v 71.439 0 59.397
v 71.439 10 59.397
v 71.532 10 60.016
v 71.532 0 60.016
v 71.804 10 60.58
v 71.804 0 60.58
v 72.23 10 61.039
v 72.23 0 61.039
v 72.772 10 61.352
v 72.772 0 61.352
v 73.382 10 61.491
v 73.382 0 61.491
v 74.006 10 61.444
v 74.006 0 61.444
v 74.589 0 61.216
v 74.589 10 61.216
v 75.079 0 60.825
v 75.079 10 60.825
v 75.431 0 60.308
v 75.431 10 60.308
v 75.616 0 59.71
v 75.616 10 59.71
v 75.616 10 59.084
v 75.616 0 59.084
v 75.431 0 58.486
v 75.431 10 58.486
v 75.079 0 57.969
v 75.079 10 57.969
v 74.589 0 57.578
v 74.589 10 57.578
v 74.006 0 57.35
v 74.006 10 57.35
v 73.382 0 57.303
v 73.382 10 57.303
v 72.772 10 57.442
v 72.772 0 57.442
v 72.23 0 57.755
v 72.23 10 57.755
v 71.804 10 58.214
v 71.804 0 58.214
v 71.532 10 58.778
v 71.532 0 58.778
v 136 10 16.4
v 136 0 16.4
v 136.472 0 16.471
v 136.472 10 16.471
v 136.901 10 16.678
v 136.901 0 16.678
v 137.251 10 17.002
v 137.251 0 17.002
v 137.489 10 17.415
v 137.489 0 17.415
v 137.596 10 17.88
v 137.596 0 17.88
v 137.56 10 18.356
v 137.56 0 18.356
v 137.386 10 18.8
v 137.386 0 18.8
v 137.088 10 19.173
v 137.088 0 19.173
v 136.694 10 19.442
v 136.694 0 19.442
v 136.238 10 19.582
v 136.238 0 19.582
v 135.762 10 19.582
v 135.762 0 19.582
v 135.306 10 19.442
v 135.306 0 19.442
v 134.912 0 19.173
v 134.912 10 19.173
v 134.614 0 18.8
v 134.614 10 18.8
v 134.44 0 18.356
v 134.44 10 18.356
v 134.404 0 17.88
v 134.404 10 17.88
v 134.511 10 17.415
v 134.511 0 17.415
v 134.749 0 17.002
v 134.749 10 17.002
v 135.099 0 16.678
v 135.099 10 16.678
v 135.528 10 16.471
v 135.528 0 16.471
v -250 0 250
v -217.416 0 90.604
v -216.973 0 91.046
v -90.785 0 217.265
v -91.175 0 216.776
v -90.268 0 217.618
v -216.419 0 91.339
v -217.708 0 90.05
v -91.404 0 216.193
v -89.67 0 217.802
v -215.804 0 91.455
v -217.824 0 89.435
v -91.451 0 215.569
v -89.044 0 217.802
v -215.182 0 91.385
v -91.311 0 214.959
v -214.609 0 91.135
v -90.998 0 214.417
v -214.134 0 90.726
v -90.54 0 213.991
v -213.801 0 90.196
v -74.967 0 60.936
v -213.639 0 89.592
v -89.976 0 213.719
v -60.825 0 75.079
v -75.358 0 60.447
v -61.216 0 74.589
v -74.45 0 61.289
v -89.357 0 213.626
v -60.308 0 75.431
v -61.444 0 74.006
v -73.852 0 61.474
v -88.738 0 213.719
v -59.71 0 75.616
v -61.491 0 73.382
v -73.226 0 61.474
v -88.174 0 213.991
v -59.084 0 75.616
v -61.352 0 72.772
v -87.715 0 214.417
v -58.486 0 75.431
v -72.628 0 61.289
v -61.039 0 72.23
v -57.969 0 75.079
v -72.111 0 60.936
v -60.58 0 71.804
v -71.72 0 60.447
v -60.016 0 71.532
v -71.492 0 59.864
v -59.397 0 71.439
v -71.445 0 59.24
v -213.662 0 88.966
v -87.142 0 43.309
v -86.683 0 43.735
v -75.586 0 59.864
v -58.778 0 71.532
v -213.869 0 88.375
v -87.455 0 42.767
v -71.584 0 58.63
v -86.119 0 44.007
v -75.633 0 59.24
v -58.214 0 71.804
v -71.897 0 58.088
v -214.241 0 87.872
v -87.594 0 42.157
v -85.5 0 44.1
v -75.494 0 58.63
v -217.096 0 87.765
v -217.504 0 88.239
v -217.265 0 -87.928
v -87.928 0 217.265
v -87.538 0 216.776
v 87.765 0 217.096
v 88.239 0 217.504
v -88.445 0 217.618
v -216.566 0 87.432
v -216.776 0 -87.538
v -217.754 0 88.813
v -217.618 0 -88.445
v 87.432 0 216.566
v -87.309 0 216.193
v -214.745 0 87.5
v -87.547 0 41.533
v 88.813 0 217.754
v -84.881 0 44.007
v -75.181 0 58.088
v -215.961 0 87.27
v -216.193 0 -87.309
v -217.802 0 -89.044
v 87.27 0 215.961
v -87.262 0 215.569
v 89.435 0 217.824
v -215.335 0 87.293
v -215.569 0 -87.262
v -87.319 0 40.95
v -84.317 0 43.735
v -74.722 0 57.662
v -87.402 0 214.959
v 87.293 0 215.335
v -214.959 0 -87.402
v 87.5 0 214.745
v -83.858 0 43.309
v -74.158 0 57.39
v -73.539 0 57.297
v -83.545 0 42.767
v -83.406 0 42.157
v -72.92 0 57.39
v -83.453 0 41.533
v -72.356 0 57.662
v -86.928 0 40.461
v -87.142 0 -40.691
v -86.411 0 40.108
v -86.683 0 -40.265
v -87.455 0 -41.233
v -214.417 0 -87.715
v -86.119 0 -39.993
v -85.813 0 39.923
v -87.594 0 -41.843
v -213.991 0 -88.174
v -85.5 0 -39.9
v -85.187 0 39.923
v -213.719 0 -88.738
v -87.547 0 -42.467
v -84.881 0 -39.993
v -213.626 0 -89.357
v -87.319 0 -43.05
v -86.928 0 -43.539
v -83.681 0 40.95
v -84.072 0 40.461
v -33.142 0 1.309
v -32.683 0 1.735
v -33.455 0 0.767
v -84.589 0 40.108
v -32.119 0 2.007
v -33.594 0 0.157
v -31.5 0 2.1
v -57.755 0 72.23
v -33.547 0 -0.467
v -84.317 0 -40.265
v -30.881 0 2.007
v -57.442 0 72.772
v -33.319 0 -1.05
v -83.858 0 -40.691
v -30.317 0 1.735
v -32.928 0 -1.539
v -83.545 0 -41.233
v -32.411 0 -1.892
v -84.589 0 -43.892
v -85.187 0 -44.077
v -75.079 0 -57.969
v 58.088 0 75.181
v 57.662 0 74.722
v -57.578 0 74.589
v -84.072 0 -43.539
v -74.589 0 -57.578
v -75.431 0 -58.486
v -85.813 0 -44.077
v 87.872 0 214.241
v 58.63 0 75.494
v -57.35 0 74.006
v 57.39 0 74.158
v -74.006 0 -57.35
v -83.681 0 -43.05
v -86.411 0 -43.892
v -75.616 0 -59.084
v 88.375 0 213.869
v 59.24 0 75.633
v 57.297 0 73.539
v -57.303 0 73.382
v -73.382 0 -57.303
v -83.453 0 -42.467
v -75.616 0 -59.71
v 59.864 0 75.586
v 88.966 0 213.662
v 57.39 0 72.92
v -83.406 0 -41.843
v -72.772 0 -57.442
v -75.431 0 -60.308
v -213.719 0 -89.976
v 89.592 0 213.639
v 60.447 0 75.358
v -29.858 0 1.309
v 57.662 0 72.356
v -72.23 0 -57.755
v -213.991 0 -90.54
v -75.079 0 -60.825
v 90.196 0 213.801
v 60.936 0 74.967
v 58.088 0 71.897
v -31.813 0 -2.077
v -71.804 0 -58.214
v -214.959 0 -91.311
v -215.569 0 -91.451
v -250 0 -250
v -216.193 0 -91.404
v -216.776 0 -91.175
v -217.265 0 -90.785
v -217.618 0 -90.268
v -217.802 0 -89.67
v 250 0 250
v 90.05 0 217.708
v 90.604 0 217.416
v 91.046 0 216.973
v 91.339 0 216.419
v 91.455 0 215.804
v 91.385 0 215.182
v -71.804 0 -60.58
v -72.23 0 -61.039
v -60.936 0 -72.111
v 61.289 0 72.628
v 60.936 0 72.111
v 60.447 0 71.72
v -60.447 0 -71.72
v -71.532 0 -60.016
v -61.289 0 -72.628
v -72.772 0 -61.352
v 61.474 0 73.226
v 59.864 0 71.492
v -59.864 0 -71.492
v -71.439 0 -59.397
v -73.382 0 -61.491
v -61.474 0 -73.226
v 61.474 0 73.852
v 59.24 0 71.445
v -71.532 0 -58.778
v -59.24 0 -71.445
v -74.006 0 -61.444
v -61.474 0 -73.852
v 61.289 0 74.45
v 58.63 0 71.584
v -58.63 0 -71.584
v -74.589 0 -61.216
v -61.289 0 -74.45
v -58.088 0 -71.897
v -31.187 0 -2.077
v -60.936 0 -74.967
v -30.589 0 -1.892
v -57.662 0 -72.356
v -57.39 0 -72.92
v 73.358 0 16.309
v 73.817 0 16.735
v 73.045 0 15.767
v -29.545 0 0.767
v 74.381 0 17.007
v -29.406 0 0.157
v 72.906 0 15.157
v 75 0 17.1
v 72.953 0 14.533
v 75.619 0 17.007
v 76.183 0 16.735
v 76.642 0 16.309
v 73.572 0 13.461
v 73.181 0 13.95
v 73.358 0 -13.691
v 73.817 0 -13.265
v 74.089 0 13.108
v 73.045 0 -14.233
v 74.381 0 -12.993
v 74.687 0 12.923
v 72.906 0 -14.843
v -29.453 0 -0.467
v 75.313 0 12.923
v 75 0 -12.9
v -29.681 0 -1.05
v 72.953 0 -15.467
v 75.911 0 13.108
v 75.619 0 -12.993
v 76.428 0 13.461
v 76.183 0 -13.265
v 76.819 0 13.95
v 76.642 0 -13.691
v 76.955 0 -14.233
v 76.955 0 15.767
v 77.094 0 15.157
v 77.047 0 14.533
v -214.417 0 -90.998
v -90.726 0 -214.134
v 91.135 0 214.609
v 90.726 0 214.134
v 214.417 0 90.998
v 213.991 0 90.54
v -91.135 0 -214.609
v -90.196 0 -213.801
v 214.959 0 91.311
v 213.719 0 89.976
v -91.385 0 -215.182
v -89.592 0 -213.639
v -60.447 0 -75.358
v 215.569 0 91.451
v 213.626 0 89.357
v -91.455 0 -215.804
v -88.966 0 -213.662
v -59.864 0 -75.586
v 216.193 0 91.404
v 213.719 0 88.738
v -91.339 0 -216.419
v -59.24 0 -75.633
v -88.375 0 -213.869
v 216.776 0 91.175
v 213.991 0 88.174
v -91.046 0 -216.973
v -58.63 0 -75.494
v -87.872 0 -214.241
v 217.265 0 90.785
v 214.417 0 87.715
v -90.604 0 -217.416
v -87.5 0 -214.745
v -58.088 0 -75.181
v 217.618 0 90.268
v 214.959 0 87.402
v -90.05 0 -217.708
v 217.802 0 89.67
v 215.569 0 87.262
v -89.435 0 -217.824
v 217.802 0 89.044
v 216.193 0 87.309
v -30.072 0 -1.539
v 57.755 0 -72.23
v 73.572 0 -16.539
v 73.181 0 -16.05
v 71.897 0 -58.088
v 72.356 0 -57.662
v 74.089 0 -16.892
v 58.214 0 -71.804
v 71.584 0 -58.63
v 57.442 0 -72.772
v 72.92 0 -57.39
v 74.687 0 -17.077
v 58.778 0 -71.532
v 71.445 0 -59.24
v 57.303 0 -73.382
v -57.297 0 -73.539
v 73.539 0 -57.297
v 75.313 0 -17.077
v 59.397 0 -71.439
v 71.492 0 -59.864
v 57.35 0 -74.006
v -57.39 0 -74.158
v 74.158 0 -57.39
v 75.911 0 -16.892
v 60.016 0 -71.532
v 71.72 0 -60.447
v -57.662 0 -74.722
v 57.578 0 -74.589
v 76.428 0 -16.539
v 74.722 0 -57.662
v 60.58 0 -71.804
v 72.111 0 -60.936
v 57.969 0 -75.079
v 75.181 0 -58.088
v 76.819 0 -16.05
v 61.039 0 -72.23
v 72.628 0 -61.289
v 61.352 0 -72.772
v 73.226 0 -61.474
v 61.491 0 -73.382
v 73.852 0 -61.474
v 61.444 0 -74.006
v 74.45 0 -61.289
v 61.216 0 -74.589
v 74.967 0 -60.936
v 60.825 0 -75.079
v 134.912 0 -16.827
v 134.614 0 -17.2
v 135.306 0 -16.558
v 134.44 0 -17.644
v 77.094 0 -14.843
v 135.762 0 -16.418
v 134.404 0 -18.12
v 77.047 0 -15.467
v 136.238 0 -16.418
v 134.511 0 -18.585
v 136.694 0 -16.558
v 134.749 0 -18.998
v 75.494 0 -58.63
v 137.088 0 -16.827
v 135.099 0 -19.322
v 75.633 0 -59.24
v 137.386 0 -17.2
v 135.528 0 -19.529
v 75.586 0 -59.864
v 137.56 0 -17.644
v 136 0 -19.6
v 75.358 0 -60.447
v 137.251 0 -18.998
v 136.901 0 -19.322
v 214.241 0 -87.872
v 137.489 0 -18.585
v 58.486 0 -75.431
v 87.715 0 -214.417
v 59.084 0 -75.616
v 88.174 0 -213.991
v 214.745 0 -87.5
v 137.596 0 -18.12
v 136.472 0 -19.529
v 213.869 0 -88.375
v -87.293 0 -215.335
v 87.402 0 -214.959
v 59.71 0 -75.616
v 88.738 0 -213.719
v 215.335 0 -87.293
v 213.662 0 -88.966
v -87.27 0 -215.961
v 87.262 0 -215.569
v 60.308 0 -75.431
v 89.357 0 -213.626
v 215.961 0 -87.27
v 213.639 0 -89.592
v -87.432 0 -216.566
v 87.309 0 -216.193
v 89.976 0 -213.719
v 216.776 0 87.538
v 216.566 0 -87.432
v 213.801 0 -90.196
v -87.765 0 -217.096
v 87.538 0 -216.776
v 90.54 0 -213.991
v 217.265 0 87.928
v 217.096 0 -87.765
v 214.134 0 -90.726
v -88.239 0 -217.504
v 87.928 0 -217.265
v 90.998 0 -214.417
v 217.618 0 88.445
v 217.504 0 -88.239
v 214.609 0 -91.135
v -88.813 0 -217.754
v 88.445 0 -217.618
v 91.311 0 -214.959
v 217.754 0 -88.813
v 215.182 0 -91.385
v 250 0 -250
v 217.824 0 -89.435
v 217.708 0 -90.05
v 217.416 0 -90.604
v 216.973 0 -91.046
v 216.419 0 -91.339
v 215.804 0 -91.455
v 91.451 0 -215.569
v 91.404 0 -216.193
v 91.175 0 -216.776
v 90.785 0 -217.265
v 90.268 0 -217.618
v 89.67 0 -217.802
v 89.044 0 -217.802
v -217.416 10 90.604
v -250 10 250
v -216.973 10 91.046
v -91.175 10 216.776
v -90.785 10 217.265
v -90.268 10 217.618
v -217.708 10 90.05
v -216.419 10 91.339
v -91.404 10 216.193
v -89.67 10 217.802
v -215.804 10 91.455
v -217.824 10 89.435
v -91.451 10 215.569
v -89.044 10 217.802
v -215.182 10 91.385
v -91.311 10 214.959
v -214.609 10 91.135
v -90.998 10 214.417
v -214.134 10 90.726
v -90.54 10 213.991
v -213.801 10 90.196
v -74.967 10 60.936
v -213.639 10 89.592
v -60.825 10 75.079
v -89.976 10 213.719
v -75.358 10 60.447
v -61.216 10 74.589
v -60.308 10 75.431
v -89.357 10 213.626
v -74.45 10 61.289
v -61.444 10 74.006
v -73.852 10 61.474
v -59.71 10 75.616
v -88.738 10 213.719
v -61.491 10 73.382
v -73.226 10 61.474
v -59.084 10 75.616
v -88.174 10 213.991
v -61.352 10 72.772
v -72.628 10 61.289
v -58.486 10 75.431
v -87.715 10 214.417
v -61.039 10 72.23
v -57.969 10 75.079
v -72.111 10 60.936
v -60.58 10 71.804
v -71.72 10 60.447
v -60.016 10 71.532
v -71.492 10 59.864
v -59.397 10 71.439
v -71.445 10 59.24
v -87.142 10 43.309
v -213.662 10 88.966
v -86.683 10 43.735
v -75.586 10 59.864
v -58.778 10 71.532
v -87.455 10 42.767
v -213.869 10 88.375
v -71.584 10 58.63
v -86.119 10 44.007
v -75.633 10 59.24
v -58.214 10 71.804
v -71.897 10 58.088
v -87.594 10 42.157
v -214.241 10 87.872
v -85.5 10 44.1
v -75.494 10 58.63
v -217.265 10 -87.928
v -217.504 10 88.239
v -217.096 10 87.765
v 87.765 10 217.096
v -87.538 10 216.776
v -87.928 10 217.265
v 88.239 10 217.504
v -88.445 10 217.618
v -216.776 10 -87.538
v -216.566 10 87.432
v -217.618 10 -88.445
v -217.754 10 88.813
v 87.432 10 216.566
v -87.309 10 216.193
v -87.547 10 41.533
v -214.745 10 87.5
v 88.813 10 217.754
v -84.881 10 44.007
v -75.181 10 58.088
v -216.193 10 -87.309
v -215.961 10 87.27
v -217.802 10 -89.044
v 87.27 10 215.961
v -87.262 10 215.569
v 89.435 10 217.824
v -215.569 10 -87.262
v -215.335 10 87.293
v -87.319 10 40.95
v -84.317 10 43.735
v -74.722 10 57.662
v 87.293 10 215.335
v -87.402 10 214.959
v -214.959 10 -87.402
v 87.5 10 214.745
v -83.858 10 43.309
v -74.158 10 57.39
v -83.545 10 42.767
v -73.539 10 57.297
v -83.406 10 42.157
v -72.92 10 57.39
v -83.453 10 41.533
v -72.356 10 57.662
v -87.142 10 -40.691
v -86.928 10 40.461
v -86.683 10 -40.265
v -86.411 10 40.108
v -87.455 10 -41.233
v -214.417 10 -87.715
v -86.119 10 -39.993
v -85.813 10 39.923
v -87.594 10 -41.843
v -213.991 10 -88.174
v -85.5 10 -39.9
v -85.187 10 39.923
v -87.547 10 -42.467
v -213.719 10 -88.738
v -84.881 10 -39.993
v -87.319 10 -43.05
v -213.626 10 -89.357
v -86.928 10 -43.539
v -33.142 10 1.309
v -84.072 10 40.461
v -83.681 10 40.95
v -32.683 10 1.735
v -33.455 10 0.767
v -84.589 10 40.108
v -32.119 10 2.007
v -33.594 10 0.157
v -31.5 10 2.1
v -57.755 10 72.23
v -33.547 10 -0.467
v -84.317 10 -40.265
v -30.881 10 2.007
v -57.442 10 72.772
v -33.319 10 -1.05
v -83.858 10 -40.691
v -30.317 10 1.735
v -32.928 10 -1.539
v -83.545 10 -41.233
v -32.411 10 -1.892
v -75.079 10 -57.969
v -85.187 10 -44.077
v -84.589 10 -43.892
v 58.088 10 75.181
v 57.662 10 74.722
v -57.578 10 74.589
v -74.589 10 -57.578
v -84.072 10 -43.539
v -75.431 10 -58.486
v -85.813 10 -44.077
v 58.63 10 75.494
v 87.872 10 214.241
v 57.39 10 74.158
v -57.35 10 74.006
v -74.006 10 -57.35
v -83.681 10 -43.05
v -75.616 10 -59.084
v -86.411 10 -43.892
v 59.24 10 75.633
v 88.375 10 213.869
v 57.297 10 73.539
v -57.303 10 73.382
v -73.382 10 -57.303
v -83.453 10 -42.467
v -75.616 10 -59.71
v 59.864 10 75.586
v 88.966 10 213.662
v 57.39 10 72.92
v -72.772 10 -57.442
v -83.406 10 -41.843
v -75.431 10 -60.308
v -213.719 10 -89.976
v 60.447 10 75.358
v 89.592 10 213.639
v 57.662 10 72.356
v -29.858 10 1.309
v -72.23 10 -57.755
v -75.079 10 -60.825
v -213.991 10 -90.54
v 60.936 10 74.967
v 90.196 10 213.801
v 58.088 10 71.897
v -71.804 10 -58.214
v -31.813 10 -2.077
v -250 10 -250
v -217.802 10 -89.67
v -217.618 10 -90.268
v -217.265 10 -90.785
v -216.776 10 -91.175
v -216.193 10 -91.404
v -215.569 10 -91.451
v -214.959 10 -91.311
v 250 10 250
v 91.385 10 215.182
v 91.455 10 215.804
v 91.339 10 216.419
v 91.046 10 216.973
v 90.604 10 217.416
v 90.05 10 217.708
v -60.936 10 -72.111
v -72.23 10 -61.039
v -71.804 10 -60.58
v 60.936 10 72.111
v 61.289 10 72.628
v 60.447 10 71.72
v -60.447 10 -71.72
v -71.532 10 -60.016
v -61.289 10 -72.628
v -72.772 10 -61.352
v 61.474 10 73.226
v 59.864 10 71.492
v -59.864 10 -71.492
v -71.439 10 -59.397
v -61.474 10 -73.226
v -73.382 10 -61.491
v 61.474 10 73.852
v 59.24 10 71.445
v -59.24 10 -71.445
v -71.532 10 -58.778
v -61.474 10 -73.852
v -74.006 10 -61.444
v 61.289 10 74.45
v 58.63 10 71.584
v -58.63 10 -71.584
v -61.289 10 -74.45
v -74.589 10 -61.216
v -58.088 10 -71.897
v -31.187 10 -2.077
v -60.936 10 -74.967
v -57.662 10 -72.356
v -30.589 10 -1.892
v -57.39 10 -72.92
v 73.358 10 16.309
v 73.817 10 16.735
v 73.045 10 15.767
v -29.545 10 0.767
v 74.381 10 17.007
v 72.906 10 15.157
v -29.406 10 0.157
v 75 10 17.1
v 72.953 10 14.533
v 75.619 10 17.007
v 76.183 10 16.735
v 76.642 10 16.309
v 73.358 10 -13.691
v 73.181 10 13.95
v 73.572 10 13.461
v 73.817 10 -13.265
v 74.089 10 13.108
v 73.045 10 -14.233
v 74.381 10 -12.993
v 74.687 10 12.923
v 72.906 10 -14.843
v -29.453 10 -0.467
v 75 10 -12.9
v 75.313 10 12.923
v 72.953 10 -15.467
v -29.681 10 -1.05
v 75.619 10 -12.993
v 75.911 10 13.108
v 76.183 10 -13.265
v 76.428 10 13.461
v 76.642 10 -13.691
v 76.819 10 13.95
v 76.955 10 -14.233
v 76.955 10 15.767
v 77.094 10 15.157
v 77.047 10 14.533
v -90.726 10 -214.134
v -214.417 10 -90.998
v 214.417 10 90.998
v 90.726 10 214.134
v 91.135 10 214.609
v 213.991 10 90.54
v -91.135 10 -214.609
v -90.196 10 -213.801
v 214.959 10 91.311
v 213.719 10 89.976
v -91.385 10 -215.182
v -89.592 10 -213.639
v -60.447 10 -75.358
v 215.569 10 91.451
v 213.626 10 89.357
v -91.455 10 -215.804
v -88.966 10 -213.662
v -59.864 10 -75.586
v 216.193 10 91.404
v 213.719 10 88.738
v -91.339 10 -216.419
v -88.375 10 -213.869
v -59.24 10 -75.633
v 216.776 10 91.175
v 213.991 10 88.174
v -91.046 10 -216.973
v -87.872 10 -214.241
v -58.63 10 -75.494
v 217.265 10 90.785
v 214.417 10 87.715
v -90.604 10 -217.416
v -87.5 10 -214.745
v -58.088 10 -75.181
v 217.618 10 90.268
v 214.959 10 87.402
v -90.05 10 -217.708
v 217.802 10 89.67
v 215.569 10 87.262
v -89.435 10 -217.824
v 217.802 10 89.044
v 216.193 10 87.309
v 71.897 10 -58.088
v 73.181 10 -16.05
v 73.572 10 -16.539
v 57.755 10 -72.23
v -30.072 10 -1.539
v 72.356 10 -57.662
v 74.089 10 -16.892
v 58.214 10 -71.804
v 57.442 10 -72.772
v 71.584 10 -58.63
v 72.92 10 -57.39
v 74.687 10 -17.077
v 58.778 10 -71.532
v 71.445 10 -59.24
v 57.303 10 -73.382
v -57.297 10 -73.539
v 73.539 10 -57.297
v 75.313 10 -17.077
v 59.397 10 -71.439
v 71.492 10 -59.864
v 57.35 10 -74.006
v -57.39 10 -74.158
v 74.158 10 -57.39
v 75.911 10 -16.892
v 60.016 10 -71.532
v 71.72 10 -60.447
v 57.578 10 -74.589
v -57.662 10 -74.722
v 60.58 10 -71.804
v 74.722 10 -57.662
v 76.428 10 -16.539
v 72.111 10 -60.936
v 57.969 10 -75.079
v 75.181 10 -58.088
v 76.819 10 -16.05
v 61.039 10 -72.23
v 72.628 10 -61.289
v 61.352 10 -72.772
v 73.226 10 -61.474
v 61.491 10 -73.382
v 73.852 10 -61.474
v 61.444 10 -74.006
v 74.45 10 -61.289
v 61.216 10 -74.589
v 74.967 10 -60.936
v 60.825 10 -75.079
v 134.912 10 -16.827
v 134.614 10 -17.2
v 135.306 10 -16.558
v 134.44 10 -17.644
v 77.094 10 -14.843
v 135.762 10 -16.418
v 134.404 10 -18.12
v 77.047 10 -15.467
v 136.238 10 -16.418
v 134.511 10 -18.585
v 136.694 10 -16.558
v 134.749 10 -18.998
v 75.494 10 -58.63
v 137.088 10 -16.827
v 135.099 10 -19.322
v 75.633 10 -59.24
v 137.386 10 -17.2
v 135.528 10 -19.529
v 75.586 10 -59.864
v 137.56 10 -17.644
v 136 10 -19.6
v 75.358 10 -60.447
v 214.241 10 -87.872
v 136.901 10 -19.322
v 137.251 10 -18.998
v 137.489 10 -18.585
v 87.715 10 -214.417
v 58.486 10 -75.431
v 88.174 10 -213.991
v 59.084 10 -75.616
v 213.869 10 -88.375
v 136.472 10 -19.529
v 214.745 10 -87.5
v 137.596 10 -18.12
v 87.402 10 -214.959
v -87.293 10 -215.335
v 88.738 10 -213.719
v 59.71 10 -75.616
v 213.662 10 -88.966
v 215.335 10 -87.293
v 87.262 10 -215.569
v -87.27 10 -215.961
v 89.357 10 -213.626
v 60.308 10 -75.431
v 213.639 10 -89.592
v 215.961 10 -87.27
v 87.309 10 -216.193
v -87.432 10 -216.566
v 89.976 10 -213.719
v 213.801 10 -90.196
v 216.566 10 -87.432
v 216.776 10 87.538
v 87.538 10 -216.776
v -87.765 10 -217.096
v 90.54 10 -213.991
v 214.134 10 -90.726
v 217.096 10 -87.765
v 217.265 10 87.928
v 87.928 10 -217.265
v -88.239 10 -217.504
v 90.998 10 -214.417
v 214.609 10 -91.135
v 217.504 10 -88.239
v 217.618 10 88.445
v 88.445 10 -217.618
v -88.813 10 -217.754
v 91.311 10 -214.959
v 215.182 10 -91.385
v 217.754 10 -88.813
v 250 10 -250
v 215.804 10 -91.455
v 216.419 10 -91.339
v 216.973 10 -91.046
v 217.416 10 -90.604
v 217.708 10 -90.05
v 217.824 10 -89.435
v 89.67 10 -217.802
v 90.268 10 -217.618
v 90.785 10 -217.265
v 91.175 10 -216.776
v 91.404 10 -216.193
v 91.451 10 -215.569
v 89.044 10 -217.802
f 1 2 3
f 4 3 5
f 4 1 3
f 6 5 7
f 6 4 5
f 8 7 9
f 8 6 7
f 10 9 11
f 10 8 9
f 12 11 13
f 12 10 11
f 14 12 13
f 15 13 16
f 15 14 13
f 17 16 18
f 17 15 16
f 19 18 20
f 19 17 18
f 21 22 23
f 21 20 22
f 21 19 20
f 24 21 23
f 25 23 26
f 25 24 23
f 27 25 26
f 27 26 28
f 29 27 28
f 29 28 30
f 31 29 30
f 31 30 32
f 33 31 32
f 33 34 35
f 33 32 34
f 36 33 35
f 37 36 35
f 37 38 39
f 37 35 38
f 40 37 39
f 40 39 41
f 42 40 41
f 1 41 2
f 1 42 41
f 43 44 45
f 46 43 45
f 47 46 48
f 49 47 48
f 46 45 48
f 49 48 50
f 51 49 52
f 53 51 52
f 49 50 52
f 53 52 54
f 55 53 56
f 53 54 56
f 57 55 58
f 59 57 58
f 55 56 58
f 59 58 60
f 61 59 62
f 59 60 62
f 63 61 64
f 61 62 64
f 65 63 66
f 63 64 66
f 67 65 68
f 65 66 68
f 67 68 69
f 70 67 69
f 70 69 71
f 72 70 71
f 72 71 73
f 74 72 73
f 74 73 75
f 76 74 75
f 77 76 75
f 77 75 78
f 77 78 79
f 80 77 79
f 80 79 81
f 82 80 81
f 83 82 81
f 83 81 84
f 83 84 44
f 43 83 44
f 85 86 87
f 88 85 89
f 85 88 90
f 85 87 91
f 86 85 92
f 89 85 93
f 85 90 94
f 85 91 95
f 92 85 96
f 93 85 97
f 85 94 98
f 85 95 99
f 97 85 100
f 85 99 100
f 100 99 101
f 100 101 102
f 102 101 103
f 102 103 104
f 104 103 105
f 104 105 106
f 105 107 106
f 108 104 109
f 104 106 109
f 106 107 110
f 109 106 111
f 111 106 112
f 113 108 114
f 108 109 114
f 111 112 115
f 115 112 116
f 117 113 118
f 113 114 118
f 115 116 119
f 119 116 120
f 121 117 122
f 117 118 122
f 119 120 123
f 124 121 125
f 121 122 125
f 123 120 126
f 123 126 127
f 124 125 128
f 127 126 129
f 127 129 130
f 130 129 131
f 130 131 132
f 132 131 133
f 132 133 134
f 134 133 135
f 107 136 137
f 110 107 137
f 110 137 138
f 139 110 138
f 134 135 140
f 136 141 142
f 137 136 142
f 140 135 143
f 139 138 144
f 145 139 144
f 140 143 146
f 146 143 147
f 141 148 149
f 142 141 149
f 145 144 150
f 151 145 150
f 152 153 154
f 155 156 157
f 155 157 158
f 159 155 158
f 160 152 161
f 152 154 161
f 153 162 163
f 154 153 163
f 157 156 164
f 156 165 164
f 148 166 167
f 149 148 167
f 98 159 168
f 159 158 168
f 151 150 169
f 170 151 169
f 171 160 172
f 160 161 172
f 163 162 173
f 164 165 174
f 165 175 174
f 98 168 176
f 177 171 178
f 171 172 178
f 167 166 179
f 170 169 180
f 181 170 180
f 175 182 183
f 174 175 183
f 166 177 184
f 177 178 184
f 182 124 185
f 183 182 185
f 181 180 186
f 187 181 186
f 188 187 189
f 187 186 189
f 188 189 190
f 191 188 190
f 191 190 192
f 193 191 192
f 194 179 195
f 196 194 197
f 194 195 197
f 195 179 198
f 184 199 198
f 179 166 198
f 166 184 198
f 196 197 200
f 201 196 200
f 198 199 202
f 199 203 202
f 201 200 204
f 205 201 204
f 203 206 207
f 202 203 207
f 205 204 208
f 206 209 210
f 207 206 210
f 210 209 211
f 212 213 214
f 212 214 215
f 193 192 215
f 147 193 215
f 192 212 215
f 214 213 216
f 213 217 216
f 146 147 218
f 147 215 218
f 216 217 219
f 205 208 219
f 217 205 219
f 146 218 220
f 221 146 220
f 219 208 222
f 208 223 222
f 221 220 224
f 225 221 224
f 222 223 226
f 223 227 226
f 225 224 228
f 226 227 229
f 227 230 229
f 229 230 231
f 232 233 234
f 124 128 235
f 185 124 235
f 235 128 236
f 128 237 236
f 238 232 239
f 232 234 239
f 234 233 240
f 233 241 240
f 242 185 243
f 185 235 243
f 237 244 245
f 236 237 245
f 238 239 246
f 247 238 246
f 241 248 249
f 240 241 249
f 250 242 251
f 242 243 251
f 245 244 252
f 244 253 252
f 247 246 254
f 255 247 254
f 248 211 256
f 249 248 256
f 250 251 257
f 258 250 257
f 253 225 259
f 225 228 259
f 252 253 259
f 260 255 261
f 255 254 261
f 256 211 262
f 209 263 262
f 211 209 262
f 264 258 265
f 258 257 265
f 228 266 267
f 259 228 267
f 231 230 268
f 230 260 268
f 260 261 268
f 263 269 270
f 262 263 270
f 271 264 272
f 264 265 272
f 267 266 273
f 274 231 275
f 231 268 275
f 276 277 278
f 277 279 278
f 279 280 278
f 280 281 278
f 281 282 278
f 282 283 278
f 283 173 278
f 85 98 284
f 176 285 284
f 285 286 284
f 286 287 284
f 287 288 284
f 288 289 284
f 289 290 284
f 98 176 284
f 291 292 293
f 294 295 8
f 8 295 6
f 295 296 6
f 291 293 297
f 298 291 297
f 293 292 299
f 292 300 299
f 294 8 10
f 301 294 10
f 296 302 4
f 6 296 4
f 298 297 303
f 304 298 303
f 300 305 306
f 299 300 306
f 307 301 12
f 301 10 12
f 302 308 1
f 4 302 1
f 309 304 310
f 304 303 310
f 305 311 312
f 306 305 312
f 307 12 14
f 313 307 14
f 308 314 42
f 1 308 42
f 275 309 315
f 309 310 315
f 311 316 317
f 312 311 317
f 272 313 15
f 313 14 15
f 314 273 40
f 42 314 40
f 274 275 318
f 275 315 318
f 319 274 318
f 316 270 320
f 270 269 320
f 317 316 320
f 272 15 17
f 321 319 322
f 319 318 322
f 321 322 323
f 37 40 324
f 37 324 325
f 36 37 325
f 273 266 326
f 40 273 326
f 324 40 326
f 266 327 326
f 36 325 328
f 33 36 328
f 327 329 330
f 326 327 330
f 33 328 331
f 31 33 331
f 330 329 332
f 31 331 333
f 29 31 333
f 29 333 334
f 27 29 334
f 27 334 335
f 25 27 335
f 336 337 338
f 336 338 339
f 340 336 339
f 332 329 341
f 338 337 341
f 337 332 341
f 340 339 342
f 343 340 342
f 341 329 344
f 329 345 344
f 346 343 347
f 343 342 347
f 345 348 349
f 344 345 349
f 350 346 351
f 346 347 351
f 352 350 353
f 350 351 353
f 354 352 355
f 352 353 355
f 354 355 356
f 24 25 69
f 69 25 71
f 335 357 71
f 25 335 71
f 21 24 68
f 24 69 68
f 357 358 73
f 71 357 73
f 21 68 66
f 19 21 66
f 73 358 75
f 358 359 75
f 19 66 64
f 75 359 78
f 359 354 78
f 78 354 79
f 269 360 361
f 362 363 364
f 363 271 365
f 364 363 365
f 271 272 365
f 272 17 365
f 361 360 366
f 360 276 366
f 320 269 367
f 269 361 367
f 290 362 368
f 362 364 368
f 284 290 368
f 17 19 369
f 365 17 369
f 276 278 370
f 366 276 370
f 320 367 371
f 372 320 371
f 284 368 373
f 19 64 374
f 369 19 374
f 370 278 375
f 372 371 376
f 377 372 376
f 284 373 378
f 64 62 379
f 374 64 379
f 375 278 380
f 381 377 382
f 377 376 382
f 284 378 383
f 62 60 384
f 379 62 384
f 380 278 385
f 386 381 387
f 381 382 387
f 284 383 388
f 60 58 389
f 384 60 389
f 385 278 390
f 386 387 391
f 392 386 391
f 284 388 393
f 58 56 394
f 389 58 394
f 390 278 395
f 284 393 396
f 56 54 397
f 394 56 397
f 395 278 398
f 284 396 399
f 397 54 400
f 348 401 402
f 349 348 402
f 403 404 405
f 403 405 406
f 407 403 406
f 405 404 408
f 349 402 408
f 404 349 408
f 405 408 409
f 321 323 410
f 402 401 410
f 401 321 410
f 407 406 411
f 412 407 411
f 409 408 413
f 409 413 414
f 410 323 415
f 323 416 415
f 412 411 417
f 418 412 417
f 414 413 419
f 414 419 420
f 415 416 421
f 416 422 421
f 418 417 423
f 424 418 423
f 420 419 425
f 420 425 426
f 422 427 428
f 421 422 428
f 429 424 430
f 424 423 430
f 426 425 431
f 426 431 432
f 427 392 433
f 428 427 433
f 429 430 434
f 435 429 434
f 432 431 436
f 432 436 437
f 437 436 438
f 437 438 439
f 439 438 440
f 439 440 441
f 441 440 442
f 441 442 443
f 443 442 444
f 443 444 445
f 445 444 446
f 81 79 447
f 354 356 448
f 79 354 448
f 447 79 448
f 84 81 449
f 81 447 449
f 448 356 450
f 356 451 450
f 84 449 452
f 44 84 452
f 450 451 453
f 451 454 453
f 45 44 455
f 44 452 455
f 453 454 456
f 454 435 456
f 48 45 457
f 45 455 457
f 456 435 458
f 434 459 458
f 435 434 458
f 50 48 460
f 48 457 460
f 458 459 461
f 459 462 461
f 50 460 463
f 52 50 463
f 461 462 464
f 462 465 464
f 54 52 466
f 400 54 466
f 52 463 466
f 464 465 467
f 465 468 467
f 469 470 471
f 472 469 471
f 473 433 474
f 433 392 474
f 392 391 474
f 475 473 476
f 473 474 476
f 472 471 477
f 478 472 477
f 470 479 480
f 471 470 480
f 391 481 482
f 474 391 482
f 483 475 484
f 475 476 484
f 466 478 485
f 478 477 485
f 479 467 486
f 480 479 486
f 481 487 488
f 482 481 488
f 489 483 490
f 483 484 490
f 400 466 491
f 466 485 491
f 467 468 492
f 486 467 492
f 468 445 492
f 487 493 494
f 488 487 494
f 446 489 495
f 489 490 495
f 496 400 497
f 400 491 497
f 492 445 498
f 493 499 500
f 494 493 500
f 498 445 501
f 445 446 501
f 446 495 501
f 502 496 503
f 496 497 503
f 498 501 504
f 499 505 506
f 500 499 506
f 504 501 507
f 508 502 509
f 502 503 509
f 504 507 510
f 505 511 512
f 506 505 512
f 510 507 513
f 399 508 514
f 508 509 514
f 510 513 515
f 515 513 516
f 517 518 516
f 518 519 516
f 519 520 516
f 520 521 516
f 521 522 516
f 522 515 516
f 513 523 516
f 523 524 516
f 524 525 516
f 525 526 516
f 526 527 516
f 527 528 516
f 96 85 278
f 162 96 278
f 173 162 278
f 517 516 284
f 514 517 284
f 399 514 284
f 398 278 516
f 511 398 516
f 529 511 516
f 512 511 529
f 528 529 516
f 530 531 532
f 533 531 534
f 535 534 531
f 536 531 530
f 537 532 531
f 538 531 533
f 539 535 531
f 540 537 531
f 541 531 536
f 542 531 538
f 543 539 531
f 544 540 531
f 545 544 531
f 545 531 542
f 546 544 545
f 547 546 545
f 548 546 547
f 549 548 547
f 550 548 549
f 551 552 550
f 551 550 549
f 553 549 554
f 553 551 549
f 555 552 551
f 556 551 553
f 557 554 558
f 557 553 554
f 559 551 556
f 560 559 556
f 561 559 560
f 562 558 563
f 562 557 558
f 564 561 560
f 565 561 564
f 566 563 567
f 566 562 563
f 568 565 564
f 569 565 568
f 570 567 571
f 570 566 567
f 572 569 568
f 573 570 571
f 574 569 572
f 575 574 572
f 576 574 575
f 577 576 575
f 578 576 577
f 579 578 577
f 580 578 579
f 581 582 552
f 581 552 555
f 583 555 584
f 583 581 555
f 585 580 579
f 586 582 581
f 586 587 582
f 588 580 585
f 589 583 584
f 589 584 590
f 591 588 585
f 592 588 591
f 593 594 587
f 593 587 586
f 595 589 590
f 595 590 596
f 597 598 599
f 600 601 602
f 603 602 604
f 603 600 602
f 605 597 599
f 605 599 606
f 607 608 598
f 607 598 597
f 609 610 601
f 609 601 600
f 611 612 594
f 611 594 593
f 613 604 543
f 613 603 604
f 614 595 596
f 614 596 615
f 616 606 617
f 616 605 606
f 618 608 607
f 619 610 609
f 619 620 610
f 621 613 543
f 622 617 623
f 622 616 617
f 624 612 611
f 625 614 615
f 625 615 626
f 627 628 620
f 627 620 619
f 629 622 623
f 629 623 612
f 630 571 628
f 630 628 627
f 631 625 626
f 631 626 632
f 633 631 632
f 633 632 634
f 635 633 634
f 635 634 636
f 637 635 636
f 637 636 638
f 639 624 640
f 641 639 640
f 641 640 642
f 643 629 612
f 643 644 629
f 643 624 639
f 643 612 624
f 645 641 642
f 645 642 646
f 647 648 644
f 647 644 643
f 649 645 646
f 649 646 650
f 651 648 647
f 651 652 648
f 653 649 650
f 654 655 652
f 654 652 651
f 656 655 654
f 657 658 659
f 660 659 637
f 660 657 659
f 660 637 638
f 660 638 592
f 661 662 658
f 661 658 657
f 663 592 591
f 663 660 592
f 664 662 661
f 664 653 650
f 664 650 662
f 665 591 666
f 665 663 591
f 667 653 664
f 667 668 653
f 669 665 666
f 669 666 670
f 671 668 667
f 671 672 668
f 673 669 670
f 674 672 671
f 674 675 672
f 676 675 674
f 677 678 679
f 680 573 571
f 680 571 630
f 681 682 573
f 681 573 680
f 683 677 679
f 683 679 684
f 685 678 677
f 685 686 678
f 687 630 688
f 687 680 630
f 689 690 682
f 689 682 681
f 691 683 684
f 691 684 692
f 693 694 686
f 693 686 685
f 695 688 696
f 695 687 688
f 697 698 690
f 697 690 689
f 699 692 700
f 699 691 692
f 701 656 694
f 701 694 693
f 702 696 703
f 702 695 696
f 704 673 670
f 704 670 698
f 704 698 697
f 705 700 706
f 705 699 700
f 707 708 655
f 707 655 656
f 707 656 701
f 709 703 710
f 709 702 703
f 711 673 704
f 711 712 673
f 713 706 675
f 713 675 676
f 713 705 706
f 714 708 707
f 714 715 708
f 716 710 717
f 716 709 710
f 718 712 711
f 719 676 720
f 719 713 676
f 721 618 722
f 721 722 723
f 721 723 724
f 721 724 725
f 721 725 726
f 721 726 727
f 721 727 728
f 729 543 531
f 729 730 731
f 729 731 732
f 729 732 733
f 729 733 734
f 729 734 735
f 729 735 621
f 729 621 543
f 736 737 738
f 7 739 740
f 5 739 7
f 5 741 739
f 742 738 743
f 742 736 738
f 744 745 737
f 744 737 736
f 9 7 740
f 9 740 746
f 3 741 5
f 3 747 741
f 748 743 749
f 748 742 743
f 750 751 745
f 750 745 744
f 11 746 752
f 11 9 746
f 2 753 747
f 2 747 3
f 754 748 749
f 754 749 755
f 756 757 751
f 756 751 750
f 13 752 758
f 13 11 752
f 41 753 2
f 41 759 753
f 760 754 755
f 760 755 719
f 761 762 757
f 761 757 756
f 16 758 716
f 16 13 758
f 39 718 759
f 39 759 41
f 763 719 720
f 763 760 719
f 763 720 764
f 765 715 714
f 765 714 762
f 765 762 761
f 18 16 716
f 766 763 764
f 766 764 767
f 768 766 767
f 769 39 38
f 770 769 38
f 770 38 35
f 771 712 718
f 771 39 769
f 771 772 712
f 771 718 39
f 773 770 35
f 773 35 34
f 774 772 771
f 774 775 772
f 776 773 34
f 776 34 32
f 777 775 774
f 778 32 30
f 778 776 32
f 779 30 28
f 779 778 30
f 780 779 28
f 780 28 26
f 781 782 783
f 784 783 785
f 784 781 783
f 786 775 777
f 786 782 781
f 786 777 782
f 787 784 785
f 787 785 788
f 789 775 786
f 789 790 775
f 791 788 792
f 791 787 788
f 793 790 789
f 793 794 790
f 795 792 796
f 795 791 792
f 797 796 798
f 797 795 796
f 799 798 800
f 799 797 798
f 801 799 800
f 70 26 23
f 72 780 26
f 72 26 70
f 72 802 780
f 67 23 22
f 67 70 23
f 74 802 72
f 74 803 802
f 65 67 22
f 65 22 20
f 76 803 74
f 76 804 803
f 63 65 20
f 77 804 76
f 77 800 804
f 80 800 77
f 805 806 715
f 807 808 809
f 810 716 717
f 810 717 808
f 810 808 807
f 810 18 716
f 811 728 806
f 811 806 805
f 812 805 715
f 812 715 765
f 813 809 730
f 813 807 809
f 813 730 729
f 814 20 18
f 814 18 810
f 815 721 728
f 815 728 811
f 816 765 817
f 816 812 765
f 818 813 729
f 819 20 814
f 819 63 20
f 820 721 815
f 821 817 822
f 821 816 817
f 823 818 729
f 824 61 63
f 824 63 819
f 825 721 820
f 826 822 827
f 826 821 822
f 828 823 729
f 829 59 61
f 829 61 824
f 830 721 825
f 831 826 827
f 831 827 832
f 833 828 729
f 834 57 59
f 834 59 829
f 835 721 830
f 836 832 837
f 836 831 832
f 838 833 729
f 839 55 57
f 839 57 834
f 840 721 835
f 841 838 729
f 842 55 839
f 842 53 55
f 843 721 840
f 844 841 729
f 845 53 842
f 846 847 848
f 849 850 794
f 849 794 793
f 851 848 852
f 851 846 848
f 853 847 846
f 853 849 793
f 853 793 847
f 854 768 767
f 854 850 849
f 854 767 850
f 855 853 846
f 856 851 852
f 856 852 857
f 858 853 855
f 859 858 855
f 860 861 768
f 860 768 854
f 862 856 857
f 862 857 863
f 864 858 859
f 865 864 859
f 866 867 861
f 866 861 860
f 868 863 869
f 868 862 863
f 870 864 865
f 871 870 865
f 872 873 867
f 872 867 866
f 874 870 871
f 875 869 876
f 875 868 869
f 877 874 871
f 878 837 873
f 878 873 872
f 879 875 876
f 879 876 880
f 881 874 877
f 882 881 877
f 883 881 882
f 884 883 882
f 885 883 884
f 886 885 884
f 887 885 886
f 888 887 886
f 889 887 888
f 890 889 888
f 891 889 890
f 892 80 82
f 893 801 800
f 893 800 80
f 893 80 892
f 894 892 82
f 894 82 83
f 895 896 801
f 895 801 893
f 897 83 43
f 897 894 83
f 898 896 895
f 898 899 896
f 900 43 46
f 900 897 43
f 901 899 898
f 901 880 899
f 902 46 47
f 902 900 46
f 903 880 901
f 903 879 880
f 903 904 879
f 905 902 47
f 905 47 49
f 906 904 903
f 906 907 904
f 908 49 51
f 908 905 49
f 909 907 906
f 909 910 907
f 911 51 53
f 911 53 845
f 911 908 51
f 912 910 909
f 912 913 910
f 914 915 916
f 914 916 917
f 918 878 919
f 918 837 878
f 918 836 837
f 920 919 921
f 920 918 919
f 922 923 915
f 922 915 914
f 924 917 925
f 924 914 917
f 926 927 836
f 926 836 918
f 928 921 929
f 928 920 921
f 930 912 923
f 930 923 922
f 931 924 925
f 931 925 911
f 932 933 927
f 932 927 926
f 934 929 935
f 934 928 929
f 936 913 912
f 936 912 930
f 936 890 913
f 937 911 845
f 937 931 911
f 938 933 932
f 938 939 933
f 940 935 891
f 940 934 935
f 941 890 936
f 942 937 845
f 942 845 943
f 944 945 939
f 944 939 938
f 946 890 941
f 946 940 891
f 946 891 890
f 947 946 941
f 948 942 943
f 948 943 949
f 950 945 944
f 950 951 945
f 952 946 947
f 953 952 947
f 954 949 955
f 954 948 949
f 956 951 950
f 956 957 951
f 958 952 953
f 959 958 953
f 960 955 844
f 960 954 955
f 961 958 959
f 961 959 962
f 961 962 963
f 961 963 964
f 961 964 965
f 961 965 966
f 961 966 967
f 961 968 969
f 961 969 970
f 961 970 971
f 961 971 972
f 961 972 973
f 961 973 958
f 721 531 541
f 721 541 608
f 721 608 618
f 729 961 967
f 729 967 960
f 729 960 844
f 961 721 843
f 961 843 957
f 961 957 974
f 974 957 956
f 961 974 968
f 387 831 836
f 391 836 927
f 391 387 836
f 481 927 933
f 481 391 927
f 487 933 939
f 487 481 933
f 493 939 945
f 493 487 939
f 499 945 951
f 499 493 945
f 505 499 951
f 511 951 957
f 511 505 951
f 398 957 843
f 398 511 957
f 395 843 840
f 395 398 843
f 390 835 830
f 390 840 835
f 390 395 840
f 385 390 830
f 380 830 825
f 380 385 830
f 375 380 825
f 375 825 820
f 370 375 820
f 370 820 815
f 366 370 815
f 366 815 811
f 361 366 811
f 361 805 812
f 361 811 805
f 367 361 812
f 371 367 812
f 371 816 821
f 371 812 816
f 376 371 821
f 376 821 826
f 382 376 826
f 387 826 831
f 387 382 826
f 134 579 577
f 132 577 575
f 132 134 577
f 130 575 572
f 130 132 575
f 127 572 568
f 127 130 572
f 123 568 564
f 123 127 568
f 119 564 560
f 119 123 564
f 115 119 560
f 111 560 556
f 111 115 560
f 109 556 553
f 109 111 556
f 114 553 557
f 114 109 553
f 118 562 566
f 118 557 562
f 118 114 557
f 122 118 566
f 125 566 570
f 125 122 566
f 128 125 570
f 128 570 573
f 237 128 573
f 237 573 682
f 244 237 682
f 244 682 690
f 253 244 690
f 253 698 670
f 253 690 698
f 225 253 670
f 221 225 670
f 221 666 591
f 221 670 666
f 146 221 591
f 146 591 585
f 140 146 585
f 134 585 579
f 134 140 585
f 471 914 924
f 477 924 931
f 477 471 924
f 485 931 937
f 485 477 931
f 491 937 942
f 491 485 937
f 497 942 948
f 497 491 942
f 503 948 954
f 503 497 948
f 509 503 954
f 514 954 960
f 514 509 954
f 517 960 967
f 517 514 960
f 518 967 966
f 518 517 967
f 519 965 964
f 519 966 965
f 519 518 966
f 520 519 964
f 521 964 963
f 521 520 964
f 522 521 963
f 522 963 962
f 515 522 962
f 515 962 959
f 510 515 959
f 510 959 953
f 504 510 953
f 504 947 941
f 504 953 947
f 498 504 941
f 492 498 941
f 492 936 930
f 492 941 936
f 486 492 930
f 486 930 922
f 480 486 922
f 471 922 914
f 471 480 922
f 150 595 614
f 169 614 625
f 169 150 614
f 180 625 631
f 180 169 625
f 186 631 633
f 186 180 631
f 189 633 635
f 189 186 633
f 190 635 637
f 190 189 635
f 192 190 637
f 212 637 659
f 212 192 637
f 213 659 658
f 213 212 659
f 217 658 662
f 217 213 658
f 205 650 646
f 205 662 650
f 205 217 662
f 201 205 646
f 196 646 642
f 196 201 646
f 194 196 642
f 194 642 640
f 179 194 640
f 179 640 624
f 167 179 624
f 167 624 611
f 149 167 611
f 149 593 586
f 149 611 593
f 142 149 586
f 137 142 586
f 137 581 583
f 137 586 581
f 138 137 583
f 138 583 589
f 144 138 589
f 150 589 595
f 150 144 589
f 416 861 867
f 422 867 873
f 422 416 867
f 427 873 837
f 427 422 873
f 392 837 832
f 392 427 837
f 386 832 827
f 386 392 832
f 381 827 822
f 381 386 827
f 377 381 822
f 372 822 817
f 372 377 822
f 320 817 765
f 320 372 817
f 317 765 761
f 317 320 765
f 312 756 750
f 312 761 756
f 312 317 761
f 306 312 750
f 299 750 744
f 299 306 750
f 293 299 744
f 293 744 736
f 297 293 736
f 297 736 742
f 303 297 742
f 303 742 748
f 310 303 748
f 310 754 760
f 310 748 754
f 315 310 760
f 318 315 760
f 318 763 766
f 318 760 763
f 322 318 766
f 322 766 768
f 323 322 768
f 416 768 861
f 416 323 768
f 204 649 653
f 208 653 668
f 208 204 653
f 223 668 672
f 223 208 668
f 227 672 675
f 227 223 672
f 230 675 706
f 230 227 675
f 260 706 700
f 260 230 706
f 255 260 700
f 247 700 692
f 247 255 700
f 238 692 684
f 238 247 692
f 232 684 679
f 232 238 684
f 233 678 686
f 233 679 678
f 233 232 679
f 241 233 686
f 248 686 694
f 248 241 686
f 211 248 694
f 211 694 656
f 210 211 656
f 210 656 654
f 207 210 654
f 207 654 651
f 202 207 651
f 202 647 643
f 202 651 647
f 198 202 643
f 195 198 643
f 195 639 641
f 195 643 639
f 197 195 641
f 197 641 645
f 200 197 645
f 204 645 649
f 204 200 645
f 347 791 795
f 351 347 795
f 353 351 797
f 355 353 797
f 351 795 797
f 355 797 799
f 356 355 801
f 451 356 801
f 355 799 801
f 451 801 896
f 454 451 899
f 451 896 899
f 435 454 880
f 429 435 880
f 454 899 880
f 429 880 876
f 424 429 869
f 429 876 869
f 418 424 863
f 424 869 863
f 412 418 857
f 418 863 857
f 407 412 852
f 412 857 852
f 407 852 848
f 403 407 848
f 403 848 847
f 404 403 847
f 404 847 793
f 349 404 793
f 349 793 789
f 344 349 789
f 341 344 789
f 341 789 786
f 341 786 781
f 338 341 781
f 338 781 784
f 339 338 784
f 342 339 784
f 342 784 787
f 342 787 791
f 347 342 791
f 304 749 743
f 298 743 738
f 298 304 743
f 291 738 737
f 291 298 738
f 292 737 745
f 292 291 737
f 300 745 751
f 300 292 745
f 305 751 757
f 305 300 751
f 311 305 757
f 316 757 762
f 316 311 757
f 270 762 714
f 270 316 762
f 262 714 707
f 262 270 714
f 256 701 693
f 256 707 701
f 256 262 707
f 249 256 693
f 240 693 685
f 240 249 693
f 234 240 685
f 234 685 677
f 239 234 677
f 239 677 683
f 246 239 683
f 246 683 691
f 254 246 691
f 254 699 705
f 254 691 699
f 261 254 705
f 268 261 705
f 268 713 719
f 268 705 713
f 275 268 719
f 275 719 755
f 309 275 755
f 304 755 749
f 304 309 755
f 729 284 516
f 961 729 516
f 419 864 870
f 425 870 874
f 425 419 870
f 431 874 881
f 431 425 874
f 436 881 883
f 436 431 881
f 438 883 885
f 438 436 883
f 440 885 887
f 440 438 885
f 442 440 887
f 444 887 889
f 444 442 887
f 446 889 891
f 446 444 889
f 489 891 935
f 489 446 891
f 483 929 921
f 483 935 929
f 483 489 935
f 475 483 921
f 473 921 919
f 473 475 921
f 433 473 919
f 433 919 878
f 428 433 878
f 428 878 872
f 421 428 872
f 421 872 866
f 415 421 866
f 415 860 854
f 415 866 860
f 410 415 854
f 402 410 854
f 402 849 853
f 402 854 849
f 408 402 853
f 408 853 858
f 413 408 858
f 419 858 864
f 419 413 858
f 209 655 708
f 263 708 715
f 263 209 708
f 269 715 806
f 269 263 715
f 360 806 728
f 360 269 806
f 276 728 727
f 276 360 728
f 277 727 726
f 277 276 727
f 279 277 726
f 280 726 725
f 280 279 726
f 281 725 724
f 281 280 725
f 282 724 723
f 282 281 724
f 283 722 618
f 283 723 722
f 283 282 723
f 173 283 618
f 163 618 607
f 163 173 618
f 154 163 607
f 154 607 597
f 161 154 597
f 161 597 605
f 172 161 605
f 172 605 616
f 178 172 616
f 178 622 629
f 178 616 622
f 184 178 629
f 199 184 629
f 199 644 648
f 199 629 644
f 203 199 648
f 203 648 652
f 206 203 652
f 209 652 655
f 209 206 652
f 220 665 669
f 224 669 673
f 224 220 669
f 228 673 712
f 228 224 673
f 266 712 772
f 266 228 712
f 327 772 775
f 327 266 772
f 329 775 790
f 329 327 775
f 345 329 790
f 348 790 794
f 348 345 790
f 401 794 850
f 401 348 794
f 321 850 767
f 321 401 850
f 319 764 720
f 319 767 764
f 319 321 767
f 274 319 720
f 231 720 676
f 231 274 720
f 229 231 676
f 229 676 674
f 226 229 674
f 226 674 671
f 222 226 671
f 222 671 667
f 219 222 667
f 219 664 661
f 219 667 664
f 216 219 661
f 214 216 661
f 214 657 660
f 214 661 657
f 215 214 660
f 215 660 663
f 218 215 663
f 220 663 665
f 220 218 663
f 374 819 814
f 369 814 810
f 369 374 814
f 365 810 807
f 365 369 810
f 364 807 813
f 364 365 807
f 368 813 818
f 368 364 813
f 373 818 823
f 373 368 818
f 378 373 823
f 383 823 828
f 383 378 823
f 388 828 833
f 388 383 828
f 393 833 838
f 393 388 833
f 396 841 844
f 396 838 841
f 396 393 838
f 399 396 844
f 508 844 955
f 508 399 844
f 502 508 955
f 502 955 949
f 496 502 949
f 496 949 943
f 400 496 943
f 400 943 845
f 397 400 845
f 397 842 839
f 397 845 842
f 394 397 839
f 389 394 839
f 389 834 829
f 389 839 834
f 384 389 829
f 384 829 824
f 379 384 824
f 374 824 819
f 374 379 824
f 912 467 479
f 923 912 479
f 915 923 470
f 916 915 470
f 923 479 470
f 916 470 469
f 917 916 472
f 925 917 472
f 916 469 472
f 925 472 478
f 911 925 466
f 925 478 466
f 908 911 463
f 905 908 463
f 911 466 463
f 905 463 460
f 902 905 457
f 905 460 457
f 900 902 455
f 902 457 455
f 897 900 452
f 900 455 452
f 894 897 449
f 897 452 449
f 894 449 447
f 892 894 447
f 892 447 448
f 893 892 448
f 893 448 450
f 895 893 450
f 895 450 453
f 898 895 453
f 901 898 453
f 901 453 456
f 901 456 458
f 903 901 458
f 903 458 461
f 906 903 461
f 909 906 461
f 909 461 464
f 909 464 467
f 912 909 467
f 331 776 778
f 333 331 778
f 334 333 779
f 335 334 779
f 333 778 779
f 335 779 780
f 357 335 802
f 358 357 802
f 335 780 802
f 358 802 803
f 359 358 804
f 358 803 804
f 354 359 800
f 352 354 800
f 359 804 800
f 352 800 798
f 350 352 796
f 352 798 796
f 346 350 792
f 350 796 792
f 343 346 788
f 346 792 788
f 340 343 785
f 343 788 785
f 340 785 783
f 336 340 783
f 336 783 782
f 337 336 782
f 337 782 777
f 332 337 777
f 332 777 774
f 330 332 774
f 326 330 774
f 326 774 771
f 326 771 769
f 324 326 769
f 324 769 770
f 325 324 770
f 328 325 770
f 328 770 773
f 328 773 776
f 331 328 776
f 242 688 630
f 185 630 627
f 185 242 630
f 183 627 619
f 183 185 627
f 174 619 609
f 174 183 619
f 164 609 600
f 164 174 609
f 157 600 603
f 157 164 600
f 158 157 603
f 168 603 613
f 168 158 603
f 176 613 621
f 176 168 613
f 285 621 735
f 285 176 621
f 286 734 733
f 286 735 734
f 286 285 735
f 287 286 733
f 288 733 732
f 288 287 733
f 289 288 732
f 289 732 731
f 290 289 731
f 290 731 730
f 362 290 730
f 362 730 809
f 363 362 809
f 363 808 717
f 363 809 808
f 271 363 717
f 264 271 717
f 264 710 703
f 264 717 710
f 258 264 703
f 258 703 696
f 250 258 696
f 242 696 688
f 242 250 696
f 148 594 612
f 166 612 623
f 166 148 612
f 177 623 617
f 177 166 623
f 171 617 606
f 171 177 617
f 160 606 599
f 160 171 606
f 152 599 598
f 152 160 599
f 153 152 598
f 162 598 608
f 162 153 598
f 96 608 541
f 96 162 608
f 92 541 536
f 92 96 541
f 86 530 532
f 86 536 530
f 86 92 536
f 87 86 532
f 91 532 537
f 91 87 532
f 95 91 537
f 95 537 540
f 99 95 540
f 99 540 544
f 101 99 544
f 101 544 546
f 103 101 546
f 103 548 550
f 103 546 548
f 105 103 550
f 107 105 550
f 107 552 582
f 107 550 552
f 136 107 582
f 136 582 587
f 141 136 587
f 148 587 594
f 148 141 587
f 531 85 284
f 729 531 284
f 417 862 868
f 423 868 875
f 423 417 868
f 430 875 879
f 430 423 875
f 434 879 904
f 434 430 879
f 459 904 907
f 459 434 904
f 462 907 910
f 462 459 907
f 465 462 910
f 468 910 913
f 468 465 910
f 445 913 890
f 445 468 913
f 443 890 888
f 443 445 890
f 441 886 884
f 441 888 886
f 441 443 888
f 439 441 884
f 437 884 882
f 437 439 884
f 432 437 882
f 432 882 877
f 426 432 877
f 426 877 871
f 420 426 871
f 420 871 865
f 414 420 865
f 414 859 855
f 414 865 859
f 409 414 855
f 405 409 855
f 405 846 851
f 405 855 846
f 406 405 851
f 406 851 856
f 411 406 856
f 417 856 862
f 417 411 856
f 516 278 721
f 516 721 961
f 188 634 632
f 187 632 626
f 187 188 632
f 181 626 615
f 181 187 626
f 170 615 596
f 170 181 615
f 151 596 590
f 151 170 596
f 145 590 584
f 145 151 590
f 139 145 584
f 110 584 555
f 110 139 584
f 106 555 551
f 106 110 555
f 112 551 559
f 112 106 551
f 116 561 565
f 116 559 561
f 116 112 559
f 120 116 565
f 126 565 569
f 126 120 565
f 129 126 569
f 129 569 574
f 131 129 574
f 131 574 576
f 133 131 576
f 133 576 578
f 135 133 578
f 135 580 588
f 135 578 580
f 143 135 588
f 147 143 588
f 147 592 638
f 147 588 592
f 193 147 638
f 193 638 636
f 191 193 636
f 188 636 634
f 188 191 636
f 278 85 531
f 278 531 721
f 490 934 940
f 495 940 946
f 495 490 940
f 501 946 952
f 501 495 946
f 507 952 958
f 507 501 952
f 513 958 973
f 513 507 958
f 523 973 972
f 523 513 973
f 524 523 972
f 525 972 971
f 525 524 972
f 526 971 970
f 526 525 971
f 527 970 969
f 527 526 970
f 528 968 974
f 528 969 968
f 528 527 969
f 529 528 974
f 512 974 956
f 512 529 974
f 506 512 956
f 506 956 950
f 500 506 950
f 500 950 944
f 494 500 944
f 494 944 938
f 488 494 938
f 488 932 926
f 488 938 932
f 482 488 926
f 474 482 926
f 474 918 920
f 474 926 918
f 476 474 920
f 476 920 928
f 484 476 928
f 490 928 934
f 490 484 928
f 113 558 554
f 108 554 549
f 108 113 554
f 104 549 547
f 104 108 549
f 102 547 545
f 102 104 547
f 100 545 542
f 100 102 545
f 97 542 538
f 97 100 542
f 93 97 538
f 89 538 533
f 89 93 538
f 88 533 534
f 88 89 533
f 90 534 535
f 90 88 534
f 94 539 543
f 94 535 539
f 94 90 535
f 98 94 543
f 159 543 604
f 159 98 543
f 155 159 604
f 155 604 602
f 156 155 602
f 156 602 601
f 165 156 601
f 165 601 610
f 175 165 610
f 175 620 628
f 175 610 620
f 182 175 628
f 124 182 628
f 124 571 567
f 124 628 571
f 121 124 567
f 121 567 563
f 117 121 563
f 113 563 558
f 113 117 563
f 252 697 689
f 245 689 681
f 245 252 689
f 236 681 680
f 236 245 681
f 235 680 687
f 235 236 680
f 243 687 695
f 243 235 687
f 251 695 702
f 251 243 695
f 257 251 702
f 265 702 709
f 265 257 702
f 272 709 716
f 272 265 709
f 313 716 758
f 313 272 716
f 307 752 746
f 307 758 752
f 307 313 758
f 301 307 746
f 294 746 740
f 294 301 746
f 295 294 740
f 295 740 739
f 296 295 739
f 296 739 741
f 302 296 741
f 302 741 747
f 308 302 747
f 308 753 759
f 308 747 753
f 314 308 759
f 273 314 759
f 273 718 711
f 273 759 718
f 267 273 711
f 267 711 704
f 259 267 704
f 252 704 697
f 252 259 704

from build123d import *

# Parameters (mm, degrees)
ESQUISSE1_W                  = 500
ESQUISSE1_H                  = 500
BOSS_EXTRU_1_DEPTH           = 10
ESQUISSE2_R                  = 2.1
ENL_V_MAT_EXTRU_1_DEPTH      = 354.694783677
R_P_TITION_CIRCULAIRE1_COUNT = 8
ESQUISSE3_R                  = 2.1
ENL_V_MAT_EXTRU_2_DEPTH      = 354.694783677
R_P_TITION_CIRCULAIRE2_COUNT = 4
ESQUISSE4_R                  = 2.1
ENL_V_MAT_EXTRU_3_DEPTH      = 354.694783677
ESQUISSE5_R                  = 1.6
ENL_V_MAT_EXTRU_4_DEPTH      = 354.694783677
ESQUISSE6_R                  = 2.1
ENL_V_MAT_EXTRU_7_DEPTH      = 354.694783677


with BuildPart() as part:
    # Esquisse1 → Boss.-Extru.1 (new body)
    with BuildSketch(Plane(origin=(0, 0, 0), x_dir=(1, 0, 0), z_dir=(0, 1, 0))):
        Rectangle(ESQUISSE1_W, ESQUISSE1_H)
    extrude(amount=BOSS_EXTRU_1_DEPTH)

    # Esquisse2 → Enlèv. mat.-Extru.1 (cut, through all)
    with BuildSketch(Plane(origin=(0, 0, 0), x_dir=(1, 0, 0), z_dir=(0, 1, 0))):
        with Locations((89.356581457, 215.725870841)):
            Circle(ESQUISSE2_R)
    enl_v_mat_extru_1 = extrude(amount=ENL_V_MAT_EXTRU_1_DEPTH, mode=Mode.SUBTRACT)

    # Répétition circulaire1: Enlèv. mat.-Extru.1 ×8 about axis
    r_p_tition_circulaire1_axis = Axis((0, -0.5, 0), (0, 1, 0))
    for i in range(1, R_P_TITION_CIRCULAIRE1_COUNT):
        add(enl_v_mat_extru_1.rotate(r_p_tition_circulaire1_axis, i * 360 / R_P_TITION_CIRCULAIRE1_COUNT), mode=Mode.SUBTRACT)

    # Esquisse3 → Enlèv. mat.-Extru.2 (cut, through all)
    with BuildSketch(Plane(origin=(0, 0, 0), x_dir=(1, 0, 0), z_dir=(0, 1, 0))):
        with Locations((59.39696962, 73.539105243)):
            Circle(ESQUISSE3_R)
        with Locations((73.539105243, 59.39696962)):
            Circle(ESQUISSE3_R)
    enl_v_mat_extru_2 = extrude(amount=ENL_V_MAT_EXTRU_2_DEPTH, mode=Mode.SUBTRACT)

    # Répétition circulaire2: Enlèv. mat.-Extru.2 ×4 about axis
    r_p_tition_circulaire2_axis = Axis((0, -0.5, 0), (0, 1, 0))
    for i in range(1, R_P_TITION_CIRCULAIRE2_COUNT):
        add(enl_v_mat_extru_2.rotate(r_p_tition_circulaire2_axis, i * 360 / R_P_TITION_CIRCULAIRE2_COUNT), mode=Mode.SUBTRACT)

    # Esquisse4 → Enlèv. mat.-Extru.3 (cut, through all)
    with BuildSketch(Plane(origin=(0, 0, 0), x_dir=(1, 0, 0), z_dir=(0, 1, 0))):
        with Locations((-85.5, 42)):
            Circle(ESQUISSE4_R)
        with Locations((-85.5, -42)):
            Circle(ESQUISSE4_R)
        with Locations((-31.5, 0)):
            Circle(ESQUISSE4_R)
    extrude(amount=ENL_V_MAT_EXTRU_3_DEPTH, mode=Mode.SUBTRACT)

    # Esquisse5 → Enlèv. mat.-Extru.4 (cut, through all)
    with BuildSketch(Plane.XZ):
        with Locations((136, -18)):
            Circle(ESQUISSE5_R)
        with Locations((136, 18)):
            Circle(ESQUISSE5_R)
    extrude(amount=-ENL_V_MAT_EXTRU_4_DEPTH, mode=Mode.SUBTRACT)

    # Esquisse6 → Enlèv. mat.-Extru.7 (cut, through all)
    with BuildSketch(Plane(origin=(0, 10, 0), x_dir=(1, 0, 0), z_dir=(0, 1, 0))):
        with Locations((75, 15)):
            Circle(ESQUISSE6_R)
        with Locations((75, -15)):
            Circle(ESQUISSE6_R)
    extrude(amount=-ENL_V_MAT_EXTRU_7_DEPTH, mode=Mode.SUBTRACT)


solid = part.part
